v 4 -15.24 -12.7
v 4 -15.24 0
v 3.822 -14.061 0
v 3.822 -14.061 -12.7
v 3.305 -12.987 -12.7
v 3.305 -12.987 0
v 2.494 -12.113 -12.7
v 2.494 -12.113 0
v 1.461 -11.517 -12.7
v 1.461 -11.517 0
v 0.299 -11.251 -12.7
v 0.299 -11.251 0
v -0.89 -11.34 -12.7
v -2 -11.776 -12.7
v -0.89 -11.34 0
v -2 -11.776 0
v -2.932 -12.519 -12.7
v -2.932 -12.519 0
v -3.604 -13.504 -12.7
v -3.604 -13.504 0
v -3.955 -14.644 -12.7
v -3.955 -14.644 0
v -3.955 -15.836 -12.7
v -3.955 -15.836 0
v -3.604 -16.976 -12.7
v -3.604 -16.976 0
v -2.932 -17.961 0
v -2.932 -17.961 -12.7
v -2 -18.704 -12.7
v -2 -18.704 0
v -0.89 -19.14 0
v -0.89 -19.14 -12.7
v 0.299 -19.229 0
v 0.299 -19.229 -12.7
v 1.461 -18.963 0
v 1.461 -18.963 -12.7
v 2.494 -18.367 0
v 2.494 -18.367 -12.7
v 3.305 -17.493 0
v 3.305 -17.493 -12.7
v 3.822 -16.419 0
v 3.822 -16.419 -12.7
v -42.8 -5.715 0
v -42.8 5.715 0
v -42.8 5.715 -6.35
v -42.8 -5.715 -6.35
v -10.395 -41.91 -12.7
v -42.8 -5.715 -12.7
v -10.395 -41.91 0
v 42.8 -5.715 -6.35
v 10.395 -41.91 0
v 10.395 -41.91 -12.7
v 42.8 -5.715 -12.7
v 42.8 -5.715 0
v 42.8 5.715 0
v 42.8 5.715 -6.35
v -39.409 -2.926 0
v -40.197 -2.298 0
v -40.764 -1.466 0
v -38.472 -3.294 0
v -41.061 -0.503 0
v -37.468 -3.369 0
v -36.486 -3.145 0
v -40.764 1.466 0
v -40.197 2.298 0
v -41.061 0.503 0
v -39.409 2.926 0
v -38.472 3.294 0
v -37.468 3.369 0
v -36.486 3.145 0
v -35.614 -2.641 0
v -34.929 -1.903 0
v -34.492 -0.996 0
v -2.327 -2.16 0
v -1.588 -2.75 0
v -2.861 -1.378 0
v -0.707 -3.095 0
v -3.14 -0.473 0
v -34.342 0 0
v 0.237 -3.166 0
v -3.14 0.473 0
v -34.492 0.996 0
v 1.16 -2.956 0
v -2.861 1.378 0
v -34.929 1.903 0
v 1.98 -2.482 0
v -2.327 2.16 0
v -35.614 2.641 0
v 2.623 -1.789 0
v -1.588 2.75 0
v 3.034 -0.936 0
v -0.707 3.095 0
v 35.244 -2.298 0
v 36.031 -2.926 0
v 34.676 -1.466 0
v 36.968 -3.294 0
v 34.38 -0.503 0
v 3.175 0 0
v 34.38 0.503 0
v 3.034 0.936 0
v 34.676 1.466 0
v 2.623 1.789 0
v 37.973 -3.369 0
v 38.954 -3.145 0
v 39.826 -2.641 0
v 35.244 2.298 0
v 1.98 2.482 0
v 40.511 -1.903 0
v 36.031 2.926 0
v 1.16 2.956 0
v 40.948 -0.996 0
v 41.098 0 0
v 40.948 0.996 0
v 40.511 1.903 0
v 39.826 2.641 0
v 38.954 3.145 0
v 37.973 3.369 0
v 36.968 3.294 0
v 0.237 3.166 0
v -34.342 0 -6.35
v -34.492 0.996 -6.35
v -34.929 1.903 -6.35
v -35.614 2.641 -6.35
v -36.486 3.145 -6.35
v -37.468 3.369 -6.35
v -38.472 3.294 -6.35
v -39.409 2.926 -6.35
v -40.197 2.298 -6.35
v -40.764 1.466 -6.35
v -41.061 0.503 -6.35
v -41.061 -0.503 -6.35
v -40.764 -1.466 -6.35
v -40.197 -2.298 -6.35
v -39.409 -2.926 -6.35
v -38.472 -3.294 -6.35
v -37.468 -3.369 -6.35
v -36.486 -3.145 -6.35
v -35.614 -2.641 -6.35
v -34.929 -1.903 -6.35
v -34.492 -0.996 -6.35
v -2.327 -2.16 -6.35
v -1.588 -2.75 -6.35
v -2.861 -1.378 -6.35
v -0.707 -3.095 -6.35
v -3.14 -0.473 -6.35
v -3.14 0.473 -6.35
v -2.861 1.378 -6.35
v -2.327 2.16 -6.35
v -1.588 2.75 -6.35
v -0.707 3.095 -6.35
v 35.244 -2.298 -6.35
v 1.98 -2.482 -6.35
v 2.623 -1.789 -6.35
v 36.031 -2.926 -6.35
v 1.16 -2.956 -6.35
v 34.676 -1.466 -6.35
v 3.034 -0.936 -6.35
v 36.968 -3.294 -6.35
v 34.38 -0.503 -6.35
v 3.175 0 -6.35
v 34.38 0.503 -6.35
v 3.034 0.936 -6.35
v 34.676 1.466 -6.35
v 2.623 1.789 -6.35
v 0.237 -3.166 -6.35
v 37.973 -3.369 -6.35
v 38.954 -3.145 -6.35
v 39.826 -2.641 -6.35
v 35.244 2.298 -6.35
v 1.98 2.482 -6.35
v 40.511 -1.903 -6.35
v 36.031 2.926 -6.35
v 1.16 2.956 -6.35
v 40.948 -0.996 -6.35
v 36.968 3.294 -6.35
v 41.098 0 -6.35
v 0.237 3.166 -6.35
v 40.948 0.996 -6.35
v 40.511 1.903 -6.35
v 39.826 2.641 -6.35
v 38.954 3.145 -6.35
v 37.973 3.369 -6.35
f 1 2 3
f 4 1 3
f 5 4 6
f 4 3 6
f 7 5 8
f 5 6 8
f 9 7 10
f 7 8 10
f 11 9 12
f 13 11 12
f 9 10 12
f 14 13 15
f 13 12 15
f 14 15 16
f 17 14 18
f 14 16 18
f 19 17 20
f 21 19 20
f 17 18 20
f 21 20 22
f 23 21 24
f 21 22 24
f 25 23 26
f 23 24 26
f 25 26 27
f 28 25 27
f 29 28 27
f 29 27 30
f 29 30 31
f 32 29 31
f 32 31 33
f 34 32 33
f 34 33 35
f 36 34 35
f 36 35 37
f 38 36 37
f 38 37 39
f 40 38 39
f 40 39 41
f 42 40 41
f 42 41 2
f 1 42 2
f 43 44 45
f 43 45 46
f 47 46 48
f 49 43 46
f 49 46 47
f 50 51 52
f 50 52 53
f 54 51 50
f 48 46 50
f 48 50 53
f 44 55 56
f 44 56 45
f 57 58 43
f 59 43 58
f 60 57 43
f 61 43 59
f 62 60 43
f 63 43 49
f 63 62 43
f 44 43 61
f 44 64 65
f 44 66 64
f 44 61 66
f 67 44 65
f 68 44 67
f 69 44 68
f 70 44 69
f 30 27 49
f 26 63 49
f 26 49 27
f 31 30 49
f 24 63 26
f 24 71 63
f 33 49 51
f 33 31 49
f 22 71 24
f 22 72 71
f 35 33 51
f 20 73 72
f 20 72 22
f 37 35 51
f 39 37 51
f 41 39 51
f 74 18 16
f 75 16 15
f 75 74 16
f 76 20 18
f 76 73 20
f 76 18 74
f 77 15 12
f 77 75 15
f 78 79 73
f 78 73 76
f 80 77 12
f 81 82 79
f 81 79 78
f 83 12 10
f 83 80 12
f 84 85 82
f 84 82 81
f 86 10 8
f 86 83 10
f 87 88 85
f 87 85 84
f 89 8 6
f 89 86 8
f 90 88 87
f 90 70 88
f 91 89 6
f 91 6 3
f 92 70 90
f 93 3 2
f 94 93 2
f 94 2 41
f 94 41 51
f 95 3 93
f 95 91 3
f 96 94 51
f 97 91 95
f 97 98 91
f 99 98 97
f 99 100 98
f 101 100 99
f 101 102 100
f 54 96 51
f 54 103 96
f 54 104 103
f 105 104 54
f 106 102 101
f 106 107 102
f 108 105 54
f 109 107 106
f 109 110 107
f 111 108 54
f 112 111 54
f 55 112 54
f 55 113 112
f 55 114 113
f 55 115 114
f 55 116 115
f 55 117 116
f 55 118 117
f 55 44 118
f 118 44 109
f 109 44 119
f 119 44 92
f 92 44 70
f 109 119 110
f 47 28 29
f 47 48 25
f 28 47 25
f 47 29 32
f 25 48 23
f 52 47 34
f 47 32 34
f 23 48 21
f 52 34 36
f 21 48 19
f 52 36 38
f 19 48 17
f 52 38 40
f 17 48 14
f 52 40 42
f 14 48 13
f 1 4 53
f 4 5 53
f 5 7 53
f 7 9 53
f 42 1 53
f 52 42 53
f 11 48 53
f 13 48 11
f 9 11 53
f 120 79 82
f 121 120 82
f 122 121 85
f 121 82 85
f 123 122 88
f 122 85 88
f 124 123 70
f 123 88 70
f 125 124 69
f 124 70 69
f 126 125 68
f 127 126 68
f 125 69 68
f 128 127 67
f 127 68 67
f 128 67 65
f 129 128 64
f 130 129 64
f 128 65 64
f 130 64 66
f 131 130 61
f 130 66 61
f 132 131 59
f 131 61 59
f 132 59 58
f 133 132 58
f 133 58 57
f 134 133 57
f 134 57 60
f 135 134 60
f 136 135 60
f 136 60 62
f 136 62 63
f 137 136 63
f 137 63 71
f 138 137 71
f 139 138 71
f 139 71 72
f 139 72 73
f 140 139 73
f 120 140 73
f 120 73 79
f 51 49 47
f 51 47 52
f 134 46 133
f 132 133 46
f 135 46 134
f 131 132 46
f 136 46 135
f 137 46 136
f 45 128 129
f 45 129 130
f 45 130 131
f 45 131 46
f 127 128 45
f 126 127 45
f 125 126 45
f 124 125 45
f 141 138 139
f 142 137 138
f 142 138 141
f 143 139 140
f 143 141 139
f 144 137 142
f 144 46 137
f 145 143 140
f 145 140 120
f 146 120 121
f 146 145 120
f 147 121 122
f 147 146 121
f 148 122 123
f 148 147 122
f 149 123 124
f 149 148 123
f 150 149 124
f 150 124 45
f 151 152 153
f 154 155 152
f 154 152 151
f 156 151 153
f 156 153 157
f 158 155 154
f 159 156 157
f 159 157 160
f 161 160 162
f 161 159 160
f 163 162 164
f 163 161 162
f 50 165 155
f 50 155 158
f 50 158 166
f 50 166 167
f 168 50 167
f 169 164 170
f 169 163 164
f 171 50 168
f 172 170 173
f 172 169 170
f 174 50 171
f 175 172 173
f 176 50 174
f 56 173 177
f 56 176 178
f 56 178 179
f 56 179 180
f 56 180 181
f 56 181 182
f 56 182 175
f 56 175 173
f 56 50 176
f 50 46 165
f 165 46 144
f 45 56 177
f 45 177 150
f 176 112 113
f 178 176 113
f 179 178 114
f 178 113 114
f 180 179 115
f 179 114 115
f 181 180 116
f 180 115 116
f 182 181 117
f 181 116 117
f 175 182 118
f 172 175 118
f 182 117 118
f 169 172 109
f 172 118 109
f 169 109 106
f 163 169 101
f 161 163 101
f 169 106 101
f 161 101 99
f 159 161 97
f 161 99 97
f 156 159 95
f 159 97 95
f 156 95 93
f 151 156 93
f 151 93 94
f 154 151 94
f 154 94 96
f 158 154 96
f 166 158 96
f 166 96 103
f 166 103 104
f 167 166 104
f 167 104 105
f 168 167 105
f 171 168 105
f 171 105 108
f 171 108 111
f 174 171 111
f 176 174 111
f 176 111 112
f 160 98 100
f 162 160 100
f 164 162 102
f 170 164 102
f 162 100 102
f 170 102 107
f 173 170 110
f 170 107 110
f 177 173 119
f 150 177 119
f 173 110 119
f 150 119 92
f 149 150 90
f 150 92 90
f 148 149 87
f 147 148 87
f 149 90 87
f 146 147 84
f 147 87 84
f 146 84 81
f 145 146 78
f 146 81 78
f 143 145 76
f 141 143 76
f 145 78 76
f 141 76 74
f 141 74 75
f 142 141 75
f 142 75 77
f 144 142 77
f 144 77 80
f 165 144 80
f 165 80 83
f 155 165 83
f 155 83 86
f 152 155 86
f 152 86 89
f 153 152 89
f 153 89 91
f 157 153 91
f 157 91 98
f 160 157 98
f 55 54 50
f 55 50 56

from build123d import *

# Parameters (mm, degrees)
BOSS_EXTRUDE1_DEPTH     = 12.7
SKETCH2_R               = 3.175
CUT_EXTRUDE1_DEPTH      = 13.7
SKETCH3_W               = 6.35
SKETCH3_H               = 11.43
CUT_EXTRUDE2_DEPTH      = 86.600261098
SKETCH4_R               = 4
CUT_EXTRUDE3_DEPTH      = 13.7
F_1_4_CLEARANCE_HOLE1_D = 6.7564


with BuildPart() as part:
    # Sketch1 → Boss-Extrude1 (new body)
    with BuildSketch(Plane.XY):
        Polygon((-42.800130549, -5.715), (-10.39539802, -41.91), (10.39539802, -41.91), (42.800130549, -5.715), (42.800130549, 5.715), (-42.800130549, 5.715), align=None)
    extrude(amount=-BOSS_EXTRUDE1_DEPTH)

    # Sketch2 → Cut-Extrude1 (cut, through all)
    with BuildSketch(Plane.XY):
        Circle(SKETCH2_R)
    extrude(amount=-CUT_EXTRUDE1_DEPTH, mode=Mode.SUBTRACT)

    # Sketch3 → Cut-Extrude2 (cut, through all)
    with BuildSketch(Plane(origin=(42.800130549, 0, 0), x_dir=(0, 0, -1), z_dir=(1, 0, 0))):
        with Locations((9.525, 0)):
            Rectangle(SKETCH3_W, SKETCH3_H)
    extrude(amount=-CUT_EXTRUDE2_DEPTH, mode=Mode.SUBTRACT)

    # Sketch4 → Cut-Extrude3 (cut, through all)
    with BuildSketch(Plane.XY):
        with Locations((0, -15.24)):
            Circle(SKETCH4_R)
    extrude(amount=-CUT_EXTRUDE3_DEPTH, mode=Mode.SUBTRACT)

    # 1/4 Clearance Hole1 (through all)
    with Locations(Plane(origin=(0, 0, -6.35), x_dir=(-1, 0, 0), z_dir=(0, 0, -1))):
        with Locations((-37.720130549, 0), (37.720130549, 0)):
            Hole(F_1_4_CLEARANCE_HOLE1_D / 2)


solid = part.part
